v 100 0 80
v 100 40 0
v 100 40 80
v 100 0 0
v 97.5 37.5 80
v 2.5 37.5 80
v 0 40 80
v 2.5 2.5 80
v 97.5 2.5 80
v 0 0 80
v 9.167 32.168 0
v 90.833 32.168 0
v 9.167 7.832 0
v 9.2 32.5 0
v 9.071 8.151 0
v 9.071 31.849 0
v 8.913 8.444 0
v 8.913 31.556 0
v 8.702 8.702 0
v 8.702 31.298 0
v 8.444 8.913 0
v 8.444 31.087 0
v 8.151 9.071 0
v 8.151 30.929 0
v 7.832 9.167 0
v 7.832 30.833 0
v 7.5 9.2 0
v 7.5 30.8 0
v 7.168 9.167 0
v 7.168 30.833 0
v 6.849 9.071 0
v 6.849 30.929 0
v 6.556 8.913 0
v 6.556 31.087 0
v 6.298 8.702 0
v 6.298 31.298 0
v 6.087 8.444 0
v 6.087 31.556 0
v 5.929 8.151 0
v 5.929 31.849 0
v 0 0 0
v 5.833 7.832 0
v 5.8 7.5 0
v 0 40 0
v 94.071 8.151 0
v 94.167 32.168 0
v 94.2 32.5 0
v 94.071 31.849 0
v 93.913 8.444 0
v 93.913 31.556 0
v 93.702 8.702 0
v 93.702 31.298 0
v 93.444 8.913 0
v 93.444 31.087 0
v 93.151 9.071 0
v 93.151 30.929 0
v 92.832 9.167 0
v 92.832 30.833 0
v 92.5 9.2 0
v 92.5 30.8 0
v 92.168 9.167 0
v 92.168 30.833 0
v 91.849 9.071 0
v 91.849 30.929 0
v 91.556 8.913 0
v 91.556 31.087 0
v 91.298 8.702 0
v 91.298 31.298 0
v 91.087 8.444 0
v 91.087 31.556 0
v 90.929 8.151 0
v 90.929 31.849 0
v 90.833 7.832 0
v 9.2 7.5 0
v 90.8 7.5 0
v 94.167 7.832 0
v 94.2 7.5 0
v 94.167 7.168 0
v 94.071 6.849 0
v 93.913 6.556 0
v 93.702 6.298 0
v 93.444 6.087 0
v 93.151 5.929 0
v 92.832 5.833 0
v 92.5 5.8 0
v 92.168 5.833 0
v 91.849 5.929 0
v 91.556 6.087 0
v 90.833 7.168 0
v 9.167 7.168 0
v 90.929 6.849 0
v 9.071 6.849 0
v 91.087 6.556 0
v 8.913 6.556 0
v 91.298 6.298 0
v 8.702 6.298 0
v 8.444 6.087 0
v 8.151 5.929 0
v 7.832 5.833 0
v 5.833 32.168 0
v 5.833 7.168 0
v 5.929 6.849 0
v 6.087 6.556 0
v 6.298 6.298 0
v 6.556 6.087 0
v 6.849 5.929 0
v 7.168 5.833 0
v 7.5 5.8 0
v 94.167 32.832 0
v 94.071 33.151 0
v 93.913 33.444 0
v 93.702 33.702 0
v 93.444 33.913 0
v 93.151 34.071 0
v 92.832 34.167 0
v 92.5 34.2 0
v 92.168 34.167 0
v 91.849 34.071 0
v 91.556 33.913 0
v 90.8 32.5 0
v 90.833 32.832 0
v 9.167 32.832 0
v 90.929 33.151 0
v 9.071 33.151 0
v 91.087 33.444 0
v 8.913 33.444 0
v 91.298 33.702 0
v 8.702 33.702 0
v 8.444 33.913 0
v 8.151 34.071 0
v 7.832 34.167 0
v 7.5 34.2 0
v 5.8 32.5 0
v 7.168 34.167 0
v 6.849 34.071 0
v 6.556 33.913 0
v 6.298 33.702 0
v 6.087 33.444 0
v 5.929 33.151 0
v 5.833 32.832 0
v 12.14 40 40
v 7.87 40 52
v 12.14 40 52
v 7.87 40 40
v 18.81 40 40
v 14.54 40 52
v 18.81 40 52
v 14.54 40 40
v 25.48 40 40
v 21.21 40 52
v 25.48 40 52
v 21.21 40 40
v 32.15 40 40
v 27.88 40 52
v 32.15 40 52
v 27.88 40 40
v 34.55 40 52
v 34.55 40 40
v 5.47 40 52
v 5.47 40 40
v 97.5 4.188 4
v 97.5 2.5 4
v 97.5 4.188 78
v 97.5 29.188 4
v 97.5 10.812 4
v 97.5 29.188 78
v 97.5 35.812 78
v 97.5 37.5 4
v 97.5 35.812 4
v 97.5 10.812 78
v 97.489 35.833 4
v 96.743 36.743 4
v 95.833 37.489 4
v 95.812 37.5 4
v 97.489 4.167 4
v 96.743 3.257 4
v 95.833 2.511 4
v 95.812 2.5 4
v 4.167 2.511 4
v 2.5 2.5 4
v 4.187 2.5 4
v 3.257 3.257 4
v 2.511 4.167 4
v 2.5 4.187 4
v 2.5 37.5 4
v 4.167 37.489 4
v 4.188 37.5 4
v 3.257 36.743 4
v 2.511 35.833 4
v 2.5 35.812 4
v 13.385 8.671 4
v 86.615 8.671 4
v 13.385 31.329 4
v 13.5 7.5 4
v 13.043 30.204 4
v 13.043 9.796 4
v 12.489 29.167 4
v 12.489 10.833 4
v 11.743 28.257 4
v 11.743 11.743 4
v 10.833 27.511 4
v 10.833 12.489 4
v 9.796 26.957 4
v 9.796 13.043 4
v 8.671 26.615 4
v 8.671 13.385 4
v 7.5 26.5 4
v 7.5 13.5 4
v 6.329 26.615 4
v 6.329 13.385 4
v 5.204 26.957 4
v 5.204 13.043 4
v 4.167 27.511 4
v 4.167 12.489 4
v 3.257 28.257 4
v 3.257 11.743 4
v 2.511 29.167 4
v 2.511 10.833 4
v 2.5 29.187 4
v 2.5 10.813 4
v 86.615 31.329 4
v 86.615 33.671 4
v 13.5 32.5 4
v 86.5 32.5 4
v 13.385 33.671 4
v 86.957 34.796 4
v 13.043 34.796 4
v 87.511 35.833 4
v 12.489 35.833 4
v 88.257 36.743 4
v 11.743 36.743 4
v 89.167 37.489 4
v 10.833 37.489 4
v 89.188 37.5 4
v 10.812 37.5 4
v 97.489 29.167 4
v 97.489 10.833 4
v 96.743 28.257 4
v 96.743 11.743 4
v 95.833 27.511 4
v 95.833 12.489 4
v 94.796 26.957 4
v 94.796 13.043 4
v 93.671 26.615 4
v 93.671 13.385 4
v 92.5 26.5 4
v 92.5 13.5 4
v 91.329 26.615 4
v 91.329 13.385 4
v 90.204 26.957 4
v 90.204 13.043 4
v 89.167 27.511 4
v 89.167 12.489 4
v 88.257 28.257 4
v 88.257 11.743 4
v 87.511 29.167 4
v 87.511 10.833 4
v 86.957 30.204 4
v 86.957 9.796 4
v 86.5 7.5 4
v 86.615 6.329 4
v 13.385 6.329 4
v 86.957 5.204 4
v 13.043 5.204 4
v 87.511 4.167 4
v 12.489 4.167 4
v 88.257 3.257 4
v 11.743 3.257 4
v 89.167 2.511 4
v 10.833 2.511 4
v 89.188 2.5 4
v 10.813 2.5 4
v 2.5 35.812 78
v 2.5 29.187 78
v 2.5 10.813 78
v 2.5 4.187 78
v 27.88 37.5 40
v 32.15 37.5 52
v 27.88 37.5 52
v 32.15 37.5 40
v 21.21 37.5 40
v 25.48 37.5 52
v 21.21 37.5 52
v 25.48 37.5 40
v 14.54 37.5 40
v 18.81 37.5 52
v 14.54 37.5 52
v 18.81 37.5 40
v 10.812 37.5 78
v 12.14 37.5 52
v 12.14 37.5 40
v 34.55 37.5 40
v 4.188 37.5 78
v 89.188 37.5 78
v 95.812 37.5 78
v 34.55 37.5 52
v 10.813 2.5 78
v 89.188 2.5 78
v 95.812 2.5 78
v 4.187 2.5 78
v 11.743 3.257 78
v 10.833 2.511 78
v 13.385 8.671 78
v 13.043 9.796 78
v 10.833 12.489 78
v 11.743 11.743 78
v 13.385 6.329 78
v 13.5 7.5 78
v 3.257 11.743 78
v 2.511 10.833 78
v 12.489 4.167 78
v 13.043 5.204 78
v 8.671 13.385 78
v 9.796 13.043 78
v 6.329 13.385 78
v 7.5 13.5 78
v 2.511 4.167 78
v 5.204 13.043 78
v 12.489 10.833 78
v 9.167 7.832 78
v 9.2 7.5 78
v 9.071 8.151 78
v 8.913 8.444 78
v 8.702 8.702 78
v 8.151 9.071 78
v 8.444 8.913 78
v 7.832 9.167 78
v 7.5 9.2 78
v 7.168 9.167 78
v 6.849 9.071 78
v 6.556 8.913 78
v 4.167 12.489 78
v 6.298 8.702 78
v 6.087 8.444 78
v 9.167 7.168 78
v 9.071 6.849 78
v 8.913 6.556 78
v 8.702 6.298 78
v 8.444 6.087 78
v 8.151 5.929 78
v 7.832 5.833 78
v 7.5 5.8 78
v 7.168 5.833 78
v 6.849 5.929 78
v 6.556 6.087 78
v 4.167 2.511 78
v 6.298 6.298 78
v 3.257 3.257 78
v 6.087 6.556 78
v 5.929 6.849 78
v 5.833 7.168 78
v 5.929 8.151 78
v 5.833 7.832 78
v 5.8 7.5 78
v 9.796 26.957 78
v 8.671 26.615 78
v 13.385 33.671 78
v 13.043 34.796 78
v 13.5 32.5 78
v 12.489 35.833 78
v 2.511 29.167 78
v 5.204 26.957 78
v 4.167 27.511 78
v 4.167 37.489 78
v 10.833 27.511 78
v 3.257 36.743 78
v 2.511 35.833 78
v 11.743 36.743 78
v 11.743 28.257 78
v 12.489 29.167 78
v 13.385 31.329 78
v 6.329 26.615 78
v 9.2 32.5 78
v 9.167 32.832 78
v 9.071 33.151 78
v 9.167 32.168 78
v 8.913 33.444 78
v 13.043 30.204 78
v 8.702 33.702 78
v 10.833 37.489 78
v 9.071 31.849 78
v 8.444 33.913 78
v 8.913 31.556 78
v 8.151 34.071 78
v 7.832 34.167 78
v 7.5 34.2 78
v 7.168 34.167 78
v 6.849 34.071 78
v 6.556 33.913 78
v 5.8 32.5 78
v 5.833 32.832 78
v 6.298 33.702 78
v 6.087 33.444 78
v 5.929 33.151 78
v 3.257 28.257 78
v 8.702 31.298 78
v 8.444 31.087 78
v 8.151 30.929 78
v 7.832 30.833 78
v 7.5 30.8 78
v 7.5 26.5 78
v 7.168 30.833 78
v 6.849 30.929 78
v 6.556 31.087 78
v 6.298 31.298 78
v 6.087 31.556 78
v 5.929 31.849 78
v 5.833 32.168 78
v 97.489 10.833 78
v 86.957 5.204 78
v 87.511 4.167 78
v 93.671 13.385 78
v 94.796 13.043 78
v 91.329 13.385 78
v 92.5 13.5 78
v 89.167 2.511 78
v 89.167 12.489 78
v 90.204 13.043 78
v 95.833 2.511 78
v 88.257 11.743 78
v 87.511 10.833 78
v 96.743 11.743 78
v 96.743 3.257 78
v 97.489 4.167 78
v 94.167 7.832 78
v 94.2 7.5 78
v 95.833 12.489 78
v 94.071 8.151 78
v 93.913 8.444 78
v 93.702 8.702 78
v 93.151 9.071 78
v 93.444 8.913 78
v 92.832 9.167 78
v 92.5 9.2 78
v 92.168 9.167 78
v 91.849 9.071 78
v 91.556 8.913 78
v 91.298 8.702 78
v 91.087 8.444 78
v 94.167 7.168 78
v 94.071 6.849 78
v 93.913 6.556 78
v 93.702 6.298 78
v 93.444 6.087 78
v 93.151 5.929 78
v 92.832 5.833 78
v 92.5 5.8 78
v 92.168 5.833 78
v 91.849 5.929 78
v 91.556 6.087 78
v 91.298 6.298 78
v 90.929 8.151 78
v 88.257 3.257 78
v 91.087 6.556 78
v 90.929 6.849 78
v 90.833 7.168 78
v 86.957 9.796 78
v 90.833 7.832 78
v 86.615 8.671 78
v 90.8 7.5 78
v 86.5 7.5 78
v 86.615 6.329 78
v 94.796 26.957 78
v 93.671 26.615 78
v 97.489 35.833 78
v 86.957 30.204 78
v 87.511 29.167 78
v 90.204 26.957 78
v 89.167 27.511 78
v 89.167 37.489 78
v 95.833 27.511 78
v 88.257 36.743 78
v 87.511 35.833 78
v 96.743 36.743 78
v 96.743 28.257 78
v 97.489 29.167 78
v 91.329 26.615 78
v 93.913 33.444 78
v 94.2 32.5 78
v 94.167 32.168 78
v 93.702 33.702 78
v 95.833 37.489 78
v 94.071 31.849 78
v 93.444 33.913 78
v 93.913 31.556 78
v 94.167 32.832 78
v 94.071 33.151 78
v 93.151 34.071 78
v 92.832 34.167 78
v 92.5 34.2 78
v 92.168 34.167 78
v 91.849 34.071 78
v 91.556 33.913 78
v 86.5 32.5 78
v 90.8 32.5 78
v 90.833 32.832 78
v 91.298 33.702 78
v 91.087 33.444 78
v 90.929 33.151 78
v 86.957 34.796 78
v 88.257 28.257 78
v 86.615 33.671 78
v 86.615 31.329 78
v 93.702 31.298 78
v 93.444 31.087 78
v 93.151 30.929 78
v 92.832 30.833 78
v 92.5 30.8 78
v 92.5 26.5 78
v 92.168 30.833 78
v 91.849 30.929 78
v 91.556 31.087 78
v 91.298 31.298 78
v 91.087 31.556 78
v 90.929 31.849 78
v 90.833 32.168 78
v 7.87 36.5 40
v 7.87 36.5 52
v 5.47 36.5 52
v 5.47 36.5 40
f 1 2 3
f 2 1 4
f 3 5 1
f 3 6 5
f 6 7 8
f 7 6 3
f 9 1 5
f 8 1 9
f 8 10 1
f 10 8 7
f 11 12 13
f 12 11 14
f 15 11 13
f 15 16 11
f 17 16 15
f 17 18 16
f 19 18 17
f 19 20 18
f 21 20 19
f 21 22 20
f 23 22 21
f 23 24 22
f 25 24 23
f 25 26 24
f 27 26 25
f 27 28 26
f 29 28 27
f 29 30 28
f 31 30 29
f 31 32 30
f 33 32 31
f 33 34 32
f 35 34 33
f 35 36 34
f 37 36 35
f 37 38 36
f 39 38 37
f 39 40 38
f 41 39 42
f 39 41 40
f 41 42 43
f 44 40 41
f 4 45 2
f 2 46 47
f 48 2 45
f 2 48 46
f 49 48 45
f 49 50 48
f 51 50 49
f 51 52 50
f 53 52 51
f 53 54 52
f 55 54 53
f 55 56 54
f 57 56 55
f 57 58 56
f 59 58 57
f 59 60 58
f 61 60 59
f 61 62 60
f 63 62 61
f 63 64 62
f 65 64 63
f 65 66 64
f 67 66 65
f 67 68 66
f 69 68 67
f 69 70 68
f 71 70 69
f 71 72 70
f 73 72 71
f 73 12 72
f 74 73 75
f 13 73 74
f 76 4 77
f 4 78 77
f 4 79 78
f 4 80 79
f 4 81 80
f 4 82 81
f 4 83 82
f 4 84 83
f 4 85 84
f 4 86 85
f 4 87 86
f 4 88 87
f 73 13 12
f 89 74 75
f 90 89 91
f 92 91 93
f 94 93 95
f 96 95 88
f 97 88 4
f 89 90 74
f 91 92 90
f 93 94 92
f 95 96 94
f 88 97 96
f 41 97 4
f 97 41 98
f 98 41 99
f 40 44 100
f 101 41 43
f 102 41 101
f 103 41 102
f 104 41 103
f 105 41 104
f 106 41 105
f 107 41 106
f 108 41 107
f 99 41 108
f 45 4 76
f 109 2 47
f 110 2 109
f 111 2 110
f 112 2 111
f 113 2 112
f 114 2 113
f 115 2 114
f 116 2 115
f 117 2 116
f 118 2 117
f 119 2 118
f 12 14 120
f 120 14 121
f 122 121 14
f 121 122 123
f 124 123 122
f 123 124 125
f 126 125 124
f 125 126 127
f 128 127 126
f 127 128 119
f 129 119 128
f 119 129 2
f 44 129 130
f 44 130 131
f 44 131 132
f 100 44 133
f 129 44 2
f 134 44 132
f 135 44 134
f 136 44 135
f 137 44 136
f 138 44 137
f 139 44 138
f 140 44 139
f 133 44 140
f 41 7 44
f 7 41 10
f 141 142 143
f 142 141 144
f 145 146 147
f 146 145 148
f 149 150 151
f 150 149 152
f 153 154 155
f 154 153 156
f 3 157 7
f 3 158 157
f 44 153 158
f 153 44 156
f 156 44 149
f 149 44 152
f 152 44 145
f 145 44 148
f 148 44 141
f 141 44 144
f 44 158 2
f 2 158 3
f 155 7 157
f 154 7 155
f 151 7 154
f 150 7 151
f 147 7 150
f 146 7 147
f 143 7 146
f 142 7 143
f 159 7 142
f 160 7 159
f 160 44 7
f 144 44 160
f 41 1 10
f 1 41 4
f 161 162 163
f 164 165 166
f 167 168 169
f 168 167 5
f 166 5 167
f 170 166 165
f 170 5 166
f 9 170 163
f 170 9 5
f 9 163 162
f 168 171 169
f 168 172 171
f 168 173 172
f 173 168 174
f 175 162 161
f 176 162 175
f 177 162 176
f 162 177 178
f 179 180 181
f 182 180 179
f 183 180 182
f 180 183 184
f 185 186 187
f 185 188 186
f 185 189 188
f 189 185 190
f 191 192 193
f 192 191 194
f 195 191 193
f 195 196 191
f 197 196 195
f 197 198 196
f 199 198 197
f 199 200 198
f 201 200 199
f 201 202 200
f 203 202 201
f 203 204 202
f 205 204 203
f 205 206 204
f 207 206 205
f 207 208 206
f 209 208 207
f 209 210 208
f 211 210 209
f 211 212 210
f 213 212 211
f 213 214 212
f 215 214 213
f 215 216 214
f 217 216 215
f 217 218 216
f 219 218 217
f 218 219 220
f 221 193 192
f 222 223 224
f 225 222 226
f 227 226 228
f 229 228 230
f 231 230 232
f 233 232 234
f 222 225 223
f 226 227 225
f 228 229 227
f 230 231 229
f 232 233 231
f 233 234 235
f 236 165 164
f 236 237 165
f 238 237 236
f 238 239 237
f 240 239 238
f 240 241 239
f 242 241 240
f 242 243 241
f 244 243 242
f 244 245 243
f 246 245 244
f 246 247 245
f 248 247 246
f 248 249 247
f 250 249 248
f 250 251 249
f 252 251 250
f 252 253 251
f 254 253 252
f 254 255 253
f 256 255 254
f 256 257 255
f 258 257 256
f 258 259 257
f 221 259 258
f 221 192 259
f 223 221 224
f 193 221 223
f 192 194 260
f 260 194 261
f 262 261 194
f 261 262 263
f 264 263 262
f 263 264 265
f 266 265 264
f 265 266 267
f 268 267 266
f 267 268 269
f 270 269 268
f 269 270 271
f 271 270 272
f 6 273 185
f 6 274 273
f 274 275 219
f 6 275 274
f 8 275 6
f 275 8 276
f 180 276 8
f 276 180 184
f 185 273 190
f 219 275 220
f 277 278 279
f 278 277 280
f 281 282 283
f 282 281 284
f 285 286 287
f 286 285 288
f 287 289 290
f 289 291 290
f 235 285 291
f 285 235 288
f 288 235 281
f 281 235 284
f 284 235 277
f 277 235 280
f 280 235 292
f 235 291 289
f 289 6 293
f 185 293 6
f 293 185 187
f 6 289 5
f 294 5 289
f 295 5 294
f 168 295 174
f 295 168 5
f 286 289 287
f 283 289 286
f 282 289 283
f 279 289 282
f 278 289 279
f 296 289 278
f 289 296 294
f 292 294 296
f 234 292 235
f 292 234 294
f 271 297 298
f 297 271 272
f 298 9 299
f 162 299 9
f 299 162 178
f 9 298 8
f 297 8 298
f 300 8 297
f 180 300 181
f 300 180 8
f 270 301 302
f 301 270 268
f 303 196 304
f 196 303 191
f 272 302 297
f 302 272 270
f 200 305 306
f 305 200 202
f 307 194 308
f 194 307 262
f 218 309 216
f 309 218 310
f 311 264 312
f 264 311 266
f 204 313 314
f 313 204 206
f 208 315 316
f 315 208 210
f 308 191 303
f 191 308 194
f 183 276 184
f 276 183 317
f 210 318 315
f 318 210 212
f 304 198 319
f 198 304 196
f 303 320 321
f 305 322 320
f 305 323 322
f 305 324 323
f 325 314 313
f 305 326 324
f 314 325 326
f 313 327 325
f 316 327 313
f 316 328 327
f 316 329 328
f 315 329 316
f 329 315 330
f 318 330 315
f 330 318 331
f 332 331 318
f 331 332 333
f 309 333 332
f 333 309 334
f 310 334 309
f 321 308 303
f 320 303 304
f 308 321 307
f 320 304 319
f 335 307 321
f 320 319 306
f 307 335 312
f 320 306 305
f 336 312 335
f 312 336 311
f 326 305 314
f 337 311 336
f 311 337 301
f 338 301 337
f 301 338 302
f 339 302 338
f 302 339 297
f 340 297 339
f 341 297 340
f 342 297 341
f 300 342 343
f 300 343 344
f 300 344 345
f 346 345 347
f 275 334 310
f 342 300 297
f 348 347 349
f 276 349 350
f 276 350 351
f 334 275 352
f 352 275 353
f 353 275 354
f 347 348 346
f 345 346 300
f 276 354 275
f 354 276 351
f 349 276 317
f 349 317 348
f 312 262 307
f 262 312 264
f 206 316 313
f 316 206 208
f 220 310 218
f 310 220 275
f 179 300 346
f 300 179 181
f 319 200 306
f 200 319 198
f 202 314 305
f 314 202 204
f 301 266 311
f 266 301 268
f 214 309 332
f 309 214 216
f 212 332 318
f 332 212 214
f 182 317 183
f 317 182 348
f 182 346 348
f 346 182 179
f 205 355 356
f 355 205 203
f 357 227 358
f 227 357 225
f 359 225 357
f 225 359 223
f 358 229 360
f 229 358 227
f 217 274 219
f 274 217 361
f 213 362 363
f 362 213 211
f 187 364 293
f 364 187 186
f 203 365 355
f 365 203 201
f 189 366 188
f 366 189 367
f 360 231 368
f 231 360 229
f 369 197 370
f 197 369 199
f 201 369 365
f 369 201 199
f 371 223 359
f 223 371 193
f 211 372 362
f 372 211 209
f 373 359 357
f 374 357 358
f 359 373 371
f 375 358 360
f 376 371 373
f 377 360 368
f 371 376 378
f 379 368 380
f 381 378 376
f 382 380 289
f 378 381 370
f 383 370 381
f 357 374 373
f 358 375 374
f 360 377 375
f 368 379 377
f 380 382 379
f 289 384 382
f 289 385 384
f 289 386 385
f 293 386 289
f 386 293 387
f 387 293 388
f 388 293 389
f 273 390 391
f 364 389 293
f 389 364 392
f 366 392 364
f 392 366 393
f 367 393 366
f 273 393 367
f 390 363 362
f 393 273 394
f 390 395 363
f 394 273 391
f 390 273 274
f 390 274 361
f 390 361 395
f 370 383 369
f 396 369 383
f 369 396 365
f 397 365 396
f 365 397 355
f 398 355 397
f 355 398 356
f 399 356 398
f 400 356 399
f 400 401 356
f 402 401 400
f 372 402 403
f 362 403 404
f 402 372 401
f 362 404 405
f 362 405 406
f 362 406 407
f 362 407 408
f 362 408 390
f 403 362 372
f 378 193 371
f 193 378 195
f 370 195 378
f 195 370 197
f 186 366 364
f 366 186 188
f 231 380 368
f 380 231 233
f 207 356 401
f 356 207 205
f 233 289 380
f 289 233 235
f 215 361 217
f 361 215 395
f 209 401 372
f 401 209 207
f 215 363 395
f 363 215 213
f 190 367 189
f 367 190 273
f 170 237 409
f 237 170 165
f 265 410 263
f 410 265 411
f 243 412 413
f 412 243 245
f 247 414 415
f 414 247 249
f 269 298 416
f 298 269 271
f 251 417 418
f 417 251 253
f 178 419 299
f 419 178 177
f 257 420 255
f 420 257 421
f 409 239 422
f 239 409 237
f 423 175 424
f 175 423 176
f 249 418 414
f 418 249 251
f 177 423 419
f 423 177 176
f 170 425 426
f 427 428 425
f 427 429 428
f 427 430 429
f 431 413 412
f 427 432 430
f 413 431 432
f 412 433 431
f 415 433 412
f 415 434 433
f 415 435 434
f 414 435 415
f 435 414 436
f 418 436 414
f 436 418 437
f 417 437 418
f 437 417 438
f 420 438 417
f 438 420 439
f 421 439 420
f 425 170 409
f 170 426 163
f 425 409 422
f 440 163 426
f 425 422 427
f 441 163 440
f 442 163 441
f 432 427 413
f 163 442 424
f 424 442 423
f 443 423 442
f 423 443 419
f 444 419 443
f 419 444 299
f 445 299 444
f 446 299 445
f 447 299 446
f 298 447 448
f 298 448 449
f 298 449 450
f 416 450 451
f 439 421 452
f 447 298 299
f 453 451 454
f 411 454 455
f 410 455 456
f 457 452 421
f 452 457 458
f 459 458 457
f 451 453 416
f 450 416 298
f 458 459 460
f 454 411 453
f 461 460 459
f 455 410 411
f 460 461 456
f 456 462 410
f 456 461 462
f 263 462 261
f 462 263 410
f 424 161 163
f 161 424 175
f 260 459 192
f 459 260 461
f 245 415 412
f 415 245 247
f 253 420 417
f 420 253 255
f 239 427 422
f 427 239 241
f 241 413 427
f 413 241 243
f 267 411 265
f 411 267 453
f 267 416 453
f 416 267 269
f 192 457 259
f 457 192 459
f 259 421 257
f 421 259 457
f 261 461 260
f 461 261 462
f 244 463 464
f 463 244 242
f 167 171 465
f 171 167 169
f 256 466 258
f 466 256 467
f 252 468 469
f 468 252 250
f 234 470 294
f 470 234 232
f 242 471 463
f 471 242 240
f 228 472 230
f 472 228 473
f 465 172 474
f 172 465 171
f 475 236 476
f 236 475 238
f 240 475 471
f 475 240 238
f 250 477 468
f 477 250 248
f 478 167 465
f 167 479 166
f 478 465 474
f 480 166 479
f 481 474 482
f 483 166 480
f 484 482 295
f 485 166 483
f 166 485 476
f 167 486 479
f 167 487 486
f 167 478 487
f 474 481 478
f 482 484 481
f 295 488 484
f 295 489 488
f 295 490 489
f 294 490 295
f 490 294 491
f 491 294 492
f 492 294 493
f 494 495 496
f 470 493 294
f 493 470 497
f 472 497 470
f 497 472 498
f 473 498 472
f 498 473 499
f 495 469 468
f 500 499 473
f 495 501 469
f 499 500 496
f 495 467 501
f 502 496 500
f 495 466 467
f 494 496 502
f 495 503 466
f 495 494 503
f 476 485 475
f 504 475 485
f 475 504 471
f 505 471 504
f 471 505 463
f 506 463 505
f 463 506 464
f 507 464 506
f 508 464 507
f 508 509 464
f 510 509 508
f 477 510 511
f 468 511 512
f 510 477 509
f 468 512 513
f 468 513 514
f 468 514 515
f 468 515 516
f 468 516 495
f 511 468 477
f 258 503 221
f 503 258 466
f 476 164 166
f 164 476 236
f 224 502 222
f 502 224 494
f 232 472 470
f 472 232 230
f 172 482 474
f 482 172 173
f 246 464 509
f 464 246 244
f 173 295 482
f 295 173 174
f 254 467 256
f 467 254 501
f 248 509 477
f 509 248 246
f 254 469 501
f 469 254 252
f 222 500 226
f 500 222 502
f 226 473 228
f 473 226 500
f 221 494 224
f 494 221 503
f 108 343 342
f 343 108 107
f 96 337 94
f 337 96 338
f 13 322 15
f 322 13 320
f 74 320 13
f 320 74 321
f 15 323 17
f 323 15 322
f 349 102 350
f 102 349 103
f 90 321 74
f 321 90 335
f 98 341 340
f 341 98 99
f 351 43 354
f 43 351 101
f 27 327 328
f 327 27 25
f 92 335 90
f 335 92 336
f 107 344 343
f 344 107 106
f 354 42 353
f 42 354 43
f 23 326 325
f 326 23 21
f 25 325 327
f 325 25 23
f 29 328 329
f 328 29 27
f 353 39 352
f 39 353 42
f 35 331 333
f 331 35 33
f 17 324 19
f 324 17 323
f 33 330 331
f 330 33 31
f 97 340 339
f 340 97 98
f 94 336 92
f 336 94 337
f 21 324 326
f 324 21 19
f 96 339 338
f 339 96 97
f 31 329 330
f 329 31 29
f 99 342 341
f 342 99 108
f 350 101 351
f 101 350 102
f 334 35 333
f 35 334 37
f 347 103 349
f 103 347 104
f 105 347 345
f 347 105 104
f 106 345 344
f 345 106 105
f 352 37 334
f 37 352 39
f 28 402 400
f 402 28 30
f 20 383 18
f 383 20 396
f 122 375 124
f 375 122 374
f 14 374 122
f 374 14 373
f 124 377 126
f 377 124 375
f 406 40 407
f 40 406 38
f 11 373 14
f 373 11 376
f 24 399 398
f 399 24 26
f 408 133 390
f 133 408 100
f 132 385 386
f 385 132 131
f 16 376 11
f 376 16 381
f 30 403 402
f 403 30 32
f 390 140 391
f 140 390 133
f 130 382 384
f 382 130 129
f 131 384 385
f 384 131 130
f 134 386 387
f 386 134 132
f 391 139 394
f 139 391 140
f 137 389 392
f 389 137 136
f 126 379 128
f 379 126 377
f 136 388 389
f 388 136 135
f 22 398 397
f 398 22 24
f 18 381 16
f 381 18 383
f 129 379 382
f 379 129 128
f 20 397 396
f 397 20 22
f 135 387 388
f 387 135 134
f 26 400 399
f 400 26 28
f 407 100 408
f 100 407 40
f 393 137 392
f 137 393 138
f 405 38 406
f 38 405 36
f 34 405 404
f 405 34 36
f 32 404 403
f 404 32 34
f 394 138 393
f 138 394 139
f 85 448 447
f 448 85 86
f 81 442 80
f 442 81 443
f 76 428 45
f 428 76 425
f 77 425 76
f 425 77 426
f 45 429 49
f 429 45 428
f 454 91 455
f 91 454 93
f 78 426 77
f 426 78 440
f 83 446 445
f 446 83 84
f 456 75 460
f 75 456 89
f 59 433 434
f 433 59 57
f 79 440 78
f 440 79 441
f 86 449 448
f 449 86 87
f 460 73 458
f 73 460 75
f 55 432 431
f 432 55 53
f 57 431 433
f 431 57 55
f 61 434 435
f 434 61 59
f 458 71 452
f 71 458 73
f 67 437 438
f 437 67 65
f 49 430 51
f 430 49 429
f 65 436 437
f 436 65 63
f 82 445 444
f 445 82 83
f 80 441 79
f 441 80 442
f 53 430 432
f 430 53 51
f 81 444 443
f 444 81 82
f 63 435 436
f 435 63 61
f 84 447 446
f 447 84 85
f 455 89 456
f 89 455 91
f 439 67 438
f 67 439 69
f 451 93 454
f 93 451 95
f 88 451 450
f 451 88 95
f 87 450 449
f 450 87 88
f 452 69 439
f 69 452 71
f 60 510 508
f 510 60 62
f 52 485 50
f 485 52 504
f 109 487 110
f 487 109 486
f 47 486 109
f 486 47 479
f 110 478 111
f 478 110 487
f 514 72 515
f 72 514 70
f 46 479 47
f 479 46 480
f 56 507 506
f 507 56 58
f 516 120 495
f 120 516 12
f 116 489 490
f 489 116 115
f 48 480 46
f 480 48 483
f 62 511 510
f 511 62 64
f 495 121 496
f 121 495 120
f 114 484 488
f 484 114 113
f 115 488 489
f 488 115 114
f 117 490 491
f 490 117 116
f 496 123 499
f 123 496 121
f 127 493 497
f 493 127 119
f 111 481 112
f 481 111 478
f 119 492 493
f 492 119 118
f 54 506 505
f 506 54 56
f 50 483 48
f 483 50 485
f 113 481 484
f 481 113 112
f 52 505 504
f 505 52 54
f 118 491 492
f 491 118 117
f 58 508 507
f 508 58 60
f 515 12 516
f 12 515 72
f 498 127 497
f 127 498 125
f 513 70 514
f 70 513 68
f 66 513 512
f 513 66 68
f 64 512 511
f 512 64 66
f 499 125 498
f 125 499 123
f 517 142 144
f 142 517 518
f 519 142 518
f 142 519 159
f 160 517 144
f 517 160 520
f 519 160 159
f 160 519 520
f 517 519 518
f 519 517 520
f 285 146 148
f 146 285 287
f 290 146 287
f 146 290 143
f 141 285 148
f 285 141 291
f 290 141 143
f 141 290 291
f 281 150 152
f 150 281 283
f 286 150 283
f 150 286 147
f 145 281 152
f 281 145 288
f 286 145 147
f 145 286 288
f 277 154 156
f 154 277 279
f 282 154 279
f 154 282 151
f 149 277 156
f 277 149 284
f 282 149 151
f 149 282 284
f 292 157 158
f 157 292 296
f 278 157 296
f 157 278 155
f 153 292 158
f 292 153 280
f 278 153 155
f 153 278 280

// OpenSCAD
$fn = 32;

// ----------------------------------------------------------------------
// Enclosure body: 100 x 40 x 80 mm, wall 2.5 mm
// ----------------------------------------------------------------------

// --- parameters (mm) ---
length = 100;             // outside length, X
width = 40;               // outside width, Y
height = 80;              // outside height, Z
wall = 2.5;               // side wall thickness
floor_t = 4;              // floor thickness
boss_d = 12;              // corner boss diameter
boss_h = 74;              // corner boss height above the floor
boss_hole_d = 3.4;        // lid screw clearance in the boss
boss_lip = 7.5;           // boss centre inset from the corner
vent_slots = 5;           // vent slots in the long wall
vent_w = 2.4;             // vent slot width
vent_h = 12;              // vent slot height
vent_pitch = 6.67;        // vent slot pitch
vent_z = 40;              // vent slot sill height

module shell() {
  difference() {
    cube([length, width, height]);
    /* hollow, open at the top */
    translate([wall, wall, floor_t])
      cube([length - 2 * wall, width - 2 * wall, height]);
  }
}

module bosses() {
  /* corner bosses, sunk 1 mm into the floor */
  for (sx = [0, 1]) for (sy = [0, 1])
    translate([sx * (length - 2 * boss_lip) + boss_lip, sy * (width - 2 * boss_lip) + boss_lip, floor_t - 1])
      cylinder(h = boss_h + 1, d = boss_d);
}

difference() {
  union() {
    shell();
    bosses();
  }
  /* boss screw holes */
  for (sx = [0, 1]) for (sy = [0, 1])
    translate([sx * (length - 2 * boss_lip) + boss_lip, sy * (width - 2 * boss_lip) + boss_lip, -1]) cylinder(h = floor_t + boss_h + 2, d = boss_hole_d);
  /* vent grille in the +Y wall */
  for (i = [0 : vent_slots - 1]) translate([vent_pitch * (i + 1) - vent_w / 2, width - wall - 1, vent_z]) cube([vent_w, wall + 2, vent_h]);
}
